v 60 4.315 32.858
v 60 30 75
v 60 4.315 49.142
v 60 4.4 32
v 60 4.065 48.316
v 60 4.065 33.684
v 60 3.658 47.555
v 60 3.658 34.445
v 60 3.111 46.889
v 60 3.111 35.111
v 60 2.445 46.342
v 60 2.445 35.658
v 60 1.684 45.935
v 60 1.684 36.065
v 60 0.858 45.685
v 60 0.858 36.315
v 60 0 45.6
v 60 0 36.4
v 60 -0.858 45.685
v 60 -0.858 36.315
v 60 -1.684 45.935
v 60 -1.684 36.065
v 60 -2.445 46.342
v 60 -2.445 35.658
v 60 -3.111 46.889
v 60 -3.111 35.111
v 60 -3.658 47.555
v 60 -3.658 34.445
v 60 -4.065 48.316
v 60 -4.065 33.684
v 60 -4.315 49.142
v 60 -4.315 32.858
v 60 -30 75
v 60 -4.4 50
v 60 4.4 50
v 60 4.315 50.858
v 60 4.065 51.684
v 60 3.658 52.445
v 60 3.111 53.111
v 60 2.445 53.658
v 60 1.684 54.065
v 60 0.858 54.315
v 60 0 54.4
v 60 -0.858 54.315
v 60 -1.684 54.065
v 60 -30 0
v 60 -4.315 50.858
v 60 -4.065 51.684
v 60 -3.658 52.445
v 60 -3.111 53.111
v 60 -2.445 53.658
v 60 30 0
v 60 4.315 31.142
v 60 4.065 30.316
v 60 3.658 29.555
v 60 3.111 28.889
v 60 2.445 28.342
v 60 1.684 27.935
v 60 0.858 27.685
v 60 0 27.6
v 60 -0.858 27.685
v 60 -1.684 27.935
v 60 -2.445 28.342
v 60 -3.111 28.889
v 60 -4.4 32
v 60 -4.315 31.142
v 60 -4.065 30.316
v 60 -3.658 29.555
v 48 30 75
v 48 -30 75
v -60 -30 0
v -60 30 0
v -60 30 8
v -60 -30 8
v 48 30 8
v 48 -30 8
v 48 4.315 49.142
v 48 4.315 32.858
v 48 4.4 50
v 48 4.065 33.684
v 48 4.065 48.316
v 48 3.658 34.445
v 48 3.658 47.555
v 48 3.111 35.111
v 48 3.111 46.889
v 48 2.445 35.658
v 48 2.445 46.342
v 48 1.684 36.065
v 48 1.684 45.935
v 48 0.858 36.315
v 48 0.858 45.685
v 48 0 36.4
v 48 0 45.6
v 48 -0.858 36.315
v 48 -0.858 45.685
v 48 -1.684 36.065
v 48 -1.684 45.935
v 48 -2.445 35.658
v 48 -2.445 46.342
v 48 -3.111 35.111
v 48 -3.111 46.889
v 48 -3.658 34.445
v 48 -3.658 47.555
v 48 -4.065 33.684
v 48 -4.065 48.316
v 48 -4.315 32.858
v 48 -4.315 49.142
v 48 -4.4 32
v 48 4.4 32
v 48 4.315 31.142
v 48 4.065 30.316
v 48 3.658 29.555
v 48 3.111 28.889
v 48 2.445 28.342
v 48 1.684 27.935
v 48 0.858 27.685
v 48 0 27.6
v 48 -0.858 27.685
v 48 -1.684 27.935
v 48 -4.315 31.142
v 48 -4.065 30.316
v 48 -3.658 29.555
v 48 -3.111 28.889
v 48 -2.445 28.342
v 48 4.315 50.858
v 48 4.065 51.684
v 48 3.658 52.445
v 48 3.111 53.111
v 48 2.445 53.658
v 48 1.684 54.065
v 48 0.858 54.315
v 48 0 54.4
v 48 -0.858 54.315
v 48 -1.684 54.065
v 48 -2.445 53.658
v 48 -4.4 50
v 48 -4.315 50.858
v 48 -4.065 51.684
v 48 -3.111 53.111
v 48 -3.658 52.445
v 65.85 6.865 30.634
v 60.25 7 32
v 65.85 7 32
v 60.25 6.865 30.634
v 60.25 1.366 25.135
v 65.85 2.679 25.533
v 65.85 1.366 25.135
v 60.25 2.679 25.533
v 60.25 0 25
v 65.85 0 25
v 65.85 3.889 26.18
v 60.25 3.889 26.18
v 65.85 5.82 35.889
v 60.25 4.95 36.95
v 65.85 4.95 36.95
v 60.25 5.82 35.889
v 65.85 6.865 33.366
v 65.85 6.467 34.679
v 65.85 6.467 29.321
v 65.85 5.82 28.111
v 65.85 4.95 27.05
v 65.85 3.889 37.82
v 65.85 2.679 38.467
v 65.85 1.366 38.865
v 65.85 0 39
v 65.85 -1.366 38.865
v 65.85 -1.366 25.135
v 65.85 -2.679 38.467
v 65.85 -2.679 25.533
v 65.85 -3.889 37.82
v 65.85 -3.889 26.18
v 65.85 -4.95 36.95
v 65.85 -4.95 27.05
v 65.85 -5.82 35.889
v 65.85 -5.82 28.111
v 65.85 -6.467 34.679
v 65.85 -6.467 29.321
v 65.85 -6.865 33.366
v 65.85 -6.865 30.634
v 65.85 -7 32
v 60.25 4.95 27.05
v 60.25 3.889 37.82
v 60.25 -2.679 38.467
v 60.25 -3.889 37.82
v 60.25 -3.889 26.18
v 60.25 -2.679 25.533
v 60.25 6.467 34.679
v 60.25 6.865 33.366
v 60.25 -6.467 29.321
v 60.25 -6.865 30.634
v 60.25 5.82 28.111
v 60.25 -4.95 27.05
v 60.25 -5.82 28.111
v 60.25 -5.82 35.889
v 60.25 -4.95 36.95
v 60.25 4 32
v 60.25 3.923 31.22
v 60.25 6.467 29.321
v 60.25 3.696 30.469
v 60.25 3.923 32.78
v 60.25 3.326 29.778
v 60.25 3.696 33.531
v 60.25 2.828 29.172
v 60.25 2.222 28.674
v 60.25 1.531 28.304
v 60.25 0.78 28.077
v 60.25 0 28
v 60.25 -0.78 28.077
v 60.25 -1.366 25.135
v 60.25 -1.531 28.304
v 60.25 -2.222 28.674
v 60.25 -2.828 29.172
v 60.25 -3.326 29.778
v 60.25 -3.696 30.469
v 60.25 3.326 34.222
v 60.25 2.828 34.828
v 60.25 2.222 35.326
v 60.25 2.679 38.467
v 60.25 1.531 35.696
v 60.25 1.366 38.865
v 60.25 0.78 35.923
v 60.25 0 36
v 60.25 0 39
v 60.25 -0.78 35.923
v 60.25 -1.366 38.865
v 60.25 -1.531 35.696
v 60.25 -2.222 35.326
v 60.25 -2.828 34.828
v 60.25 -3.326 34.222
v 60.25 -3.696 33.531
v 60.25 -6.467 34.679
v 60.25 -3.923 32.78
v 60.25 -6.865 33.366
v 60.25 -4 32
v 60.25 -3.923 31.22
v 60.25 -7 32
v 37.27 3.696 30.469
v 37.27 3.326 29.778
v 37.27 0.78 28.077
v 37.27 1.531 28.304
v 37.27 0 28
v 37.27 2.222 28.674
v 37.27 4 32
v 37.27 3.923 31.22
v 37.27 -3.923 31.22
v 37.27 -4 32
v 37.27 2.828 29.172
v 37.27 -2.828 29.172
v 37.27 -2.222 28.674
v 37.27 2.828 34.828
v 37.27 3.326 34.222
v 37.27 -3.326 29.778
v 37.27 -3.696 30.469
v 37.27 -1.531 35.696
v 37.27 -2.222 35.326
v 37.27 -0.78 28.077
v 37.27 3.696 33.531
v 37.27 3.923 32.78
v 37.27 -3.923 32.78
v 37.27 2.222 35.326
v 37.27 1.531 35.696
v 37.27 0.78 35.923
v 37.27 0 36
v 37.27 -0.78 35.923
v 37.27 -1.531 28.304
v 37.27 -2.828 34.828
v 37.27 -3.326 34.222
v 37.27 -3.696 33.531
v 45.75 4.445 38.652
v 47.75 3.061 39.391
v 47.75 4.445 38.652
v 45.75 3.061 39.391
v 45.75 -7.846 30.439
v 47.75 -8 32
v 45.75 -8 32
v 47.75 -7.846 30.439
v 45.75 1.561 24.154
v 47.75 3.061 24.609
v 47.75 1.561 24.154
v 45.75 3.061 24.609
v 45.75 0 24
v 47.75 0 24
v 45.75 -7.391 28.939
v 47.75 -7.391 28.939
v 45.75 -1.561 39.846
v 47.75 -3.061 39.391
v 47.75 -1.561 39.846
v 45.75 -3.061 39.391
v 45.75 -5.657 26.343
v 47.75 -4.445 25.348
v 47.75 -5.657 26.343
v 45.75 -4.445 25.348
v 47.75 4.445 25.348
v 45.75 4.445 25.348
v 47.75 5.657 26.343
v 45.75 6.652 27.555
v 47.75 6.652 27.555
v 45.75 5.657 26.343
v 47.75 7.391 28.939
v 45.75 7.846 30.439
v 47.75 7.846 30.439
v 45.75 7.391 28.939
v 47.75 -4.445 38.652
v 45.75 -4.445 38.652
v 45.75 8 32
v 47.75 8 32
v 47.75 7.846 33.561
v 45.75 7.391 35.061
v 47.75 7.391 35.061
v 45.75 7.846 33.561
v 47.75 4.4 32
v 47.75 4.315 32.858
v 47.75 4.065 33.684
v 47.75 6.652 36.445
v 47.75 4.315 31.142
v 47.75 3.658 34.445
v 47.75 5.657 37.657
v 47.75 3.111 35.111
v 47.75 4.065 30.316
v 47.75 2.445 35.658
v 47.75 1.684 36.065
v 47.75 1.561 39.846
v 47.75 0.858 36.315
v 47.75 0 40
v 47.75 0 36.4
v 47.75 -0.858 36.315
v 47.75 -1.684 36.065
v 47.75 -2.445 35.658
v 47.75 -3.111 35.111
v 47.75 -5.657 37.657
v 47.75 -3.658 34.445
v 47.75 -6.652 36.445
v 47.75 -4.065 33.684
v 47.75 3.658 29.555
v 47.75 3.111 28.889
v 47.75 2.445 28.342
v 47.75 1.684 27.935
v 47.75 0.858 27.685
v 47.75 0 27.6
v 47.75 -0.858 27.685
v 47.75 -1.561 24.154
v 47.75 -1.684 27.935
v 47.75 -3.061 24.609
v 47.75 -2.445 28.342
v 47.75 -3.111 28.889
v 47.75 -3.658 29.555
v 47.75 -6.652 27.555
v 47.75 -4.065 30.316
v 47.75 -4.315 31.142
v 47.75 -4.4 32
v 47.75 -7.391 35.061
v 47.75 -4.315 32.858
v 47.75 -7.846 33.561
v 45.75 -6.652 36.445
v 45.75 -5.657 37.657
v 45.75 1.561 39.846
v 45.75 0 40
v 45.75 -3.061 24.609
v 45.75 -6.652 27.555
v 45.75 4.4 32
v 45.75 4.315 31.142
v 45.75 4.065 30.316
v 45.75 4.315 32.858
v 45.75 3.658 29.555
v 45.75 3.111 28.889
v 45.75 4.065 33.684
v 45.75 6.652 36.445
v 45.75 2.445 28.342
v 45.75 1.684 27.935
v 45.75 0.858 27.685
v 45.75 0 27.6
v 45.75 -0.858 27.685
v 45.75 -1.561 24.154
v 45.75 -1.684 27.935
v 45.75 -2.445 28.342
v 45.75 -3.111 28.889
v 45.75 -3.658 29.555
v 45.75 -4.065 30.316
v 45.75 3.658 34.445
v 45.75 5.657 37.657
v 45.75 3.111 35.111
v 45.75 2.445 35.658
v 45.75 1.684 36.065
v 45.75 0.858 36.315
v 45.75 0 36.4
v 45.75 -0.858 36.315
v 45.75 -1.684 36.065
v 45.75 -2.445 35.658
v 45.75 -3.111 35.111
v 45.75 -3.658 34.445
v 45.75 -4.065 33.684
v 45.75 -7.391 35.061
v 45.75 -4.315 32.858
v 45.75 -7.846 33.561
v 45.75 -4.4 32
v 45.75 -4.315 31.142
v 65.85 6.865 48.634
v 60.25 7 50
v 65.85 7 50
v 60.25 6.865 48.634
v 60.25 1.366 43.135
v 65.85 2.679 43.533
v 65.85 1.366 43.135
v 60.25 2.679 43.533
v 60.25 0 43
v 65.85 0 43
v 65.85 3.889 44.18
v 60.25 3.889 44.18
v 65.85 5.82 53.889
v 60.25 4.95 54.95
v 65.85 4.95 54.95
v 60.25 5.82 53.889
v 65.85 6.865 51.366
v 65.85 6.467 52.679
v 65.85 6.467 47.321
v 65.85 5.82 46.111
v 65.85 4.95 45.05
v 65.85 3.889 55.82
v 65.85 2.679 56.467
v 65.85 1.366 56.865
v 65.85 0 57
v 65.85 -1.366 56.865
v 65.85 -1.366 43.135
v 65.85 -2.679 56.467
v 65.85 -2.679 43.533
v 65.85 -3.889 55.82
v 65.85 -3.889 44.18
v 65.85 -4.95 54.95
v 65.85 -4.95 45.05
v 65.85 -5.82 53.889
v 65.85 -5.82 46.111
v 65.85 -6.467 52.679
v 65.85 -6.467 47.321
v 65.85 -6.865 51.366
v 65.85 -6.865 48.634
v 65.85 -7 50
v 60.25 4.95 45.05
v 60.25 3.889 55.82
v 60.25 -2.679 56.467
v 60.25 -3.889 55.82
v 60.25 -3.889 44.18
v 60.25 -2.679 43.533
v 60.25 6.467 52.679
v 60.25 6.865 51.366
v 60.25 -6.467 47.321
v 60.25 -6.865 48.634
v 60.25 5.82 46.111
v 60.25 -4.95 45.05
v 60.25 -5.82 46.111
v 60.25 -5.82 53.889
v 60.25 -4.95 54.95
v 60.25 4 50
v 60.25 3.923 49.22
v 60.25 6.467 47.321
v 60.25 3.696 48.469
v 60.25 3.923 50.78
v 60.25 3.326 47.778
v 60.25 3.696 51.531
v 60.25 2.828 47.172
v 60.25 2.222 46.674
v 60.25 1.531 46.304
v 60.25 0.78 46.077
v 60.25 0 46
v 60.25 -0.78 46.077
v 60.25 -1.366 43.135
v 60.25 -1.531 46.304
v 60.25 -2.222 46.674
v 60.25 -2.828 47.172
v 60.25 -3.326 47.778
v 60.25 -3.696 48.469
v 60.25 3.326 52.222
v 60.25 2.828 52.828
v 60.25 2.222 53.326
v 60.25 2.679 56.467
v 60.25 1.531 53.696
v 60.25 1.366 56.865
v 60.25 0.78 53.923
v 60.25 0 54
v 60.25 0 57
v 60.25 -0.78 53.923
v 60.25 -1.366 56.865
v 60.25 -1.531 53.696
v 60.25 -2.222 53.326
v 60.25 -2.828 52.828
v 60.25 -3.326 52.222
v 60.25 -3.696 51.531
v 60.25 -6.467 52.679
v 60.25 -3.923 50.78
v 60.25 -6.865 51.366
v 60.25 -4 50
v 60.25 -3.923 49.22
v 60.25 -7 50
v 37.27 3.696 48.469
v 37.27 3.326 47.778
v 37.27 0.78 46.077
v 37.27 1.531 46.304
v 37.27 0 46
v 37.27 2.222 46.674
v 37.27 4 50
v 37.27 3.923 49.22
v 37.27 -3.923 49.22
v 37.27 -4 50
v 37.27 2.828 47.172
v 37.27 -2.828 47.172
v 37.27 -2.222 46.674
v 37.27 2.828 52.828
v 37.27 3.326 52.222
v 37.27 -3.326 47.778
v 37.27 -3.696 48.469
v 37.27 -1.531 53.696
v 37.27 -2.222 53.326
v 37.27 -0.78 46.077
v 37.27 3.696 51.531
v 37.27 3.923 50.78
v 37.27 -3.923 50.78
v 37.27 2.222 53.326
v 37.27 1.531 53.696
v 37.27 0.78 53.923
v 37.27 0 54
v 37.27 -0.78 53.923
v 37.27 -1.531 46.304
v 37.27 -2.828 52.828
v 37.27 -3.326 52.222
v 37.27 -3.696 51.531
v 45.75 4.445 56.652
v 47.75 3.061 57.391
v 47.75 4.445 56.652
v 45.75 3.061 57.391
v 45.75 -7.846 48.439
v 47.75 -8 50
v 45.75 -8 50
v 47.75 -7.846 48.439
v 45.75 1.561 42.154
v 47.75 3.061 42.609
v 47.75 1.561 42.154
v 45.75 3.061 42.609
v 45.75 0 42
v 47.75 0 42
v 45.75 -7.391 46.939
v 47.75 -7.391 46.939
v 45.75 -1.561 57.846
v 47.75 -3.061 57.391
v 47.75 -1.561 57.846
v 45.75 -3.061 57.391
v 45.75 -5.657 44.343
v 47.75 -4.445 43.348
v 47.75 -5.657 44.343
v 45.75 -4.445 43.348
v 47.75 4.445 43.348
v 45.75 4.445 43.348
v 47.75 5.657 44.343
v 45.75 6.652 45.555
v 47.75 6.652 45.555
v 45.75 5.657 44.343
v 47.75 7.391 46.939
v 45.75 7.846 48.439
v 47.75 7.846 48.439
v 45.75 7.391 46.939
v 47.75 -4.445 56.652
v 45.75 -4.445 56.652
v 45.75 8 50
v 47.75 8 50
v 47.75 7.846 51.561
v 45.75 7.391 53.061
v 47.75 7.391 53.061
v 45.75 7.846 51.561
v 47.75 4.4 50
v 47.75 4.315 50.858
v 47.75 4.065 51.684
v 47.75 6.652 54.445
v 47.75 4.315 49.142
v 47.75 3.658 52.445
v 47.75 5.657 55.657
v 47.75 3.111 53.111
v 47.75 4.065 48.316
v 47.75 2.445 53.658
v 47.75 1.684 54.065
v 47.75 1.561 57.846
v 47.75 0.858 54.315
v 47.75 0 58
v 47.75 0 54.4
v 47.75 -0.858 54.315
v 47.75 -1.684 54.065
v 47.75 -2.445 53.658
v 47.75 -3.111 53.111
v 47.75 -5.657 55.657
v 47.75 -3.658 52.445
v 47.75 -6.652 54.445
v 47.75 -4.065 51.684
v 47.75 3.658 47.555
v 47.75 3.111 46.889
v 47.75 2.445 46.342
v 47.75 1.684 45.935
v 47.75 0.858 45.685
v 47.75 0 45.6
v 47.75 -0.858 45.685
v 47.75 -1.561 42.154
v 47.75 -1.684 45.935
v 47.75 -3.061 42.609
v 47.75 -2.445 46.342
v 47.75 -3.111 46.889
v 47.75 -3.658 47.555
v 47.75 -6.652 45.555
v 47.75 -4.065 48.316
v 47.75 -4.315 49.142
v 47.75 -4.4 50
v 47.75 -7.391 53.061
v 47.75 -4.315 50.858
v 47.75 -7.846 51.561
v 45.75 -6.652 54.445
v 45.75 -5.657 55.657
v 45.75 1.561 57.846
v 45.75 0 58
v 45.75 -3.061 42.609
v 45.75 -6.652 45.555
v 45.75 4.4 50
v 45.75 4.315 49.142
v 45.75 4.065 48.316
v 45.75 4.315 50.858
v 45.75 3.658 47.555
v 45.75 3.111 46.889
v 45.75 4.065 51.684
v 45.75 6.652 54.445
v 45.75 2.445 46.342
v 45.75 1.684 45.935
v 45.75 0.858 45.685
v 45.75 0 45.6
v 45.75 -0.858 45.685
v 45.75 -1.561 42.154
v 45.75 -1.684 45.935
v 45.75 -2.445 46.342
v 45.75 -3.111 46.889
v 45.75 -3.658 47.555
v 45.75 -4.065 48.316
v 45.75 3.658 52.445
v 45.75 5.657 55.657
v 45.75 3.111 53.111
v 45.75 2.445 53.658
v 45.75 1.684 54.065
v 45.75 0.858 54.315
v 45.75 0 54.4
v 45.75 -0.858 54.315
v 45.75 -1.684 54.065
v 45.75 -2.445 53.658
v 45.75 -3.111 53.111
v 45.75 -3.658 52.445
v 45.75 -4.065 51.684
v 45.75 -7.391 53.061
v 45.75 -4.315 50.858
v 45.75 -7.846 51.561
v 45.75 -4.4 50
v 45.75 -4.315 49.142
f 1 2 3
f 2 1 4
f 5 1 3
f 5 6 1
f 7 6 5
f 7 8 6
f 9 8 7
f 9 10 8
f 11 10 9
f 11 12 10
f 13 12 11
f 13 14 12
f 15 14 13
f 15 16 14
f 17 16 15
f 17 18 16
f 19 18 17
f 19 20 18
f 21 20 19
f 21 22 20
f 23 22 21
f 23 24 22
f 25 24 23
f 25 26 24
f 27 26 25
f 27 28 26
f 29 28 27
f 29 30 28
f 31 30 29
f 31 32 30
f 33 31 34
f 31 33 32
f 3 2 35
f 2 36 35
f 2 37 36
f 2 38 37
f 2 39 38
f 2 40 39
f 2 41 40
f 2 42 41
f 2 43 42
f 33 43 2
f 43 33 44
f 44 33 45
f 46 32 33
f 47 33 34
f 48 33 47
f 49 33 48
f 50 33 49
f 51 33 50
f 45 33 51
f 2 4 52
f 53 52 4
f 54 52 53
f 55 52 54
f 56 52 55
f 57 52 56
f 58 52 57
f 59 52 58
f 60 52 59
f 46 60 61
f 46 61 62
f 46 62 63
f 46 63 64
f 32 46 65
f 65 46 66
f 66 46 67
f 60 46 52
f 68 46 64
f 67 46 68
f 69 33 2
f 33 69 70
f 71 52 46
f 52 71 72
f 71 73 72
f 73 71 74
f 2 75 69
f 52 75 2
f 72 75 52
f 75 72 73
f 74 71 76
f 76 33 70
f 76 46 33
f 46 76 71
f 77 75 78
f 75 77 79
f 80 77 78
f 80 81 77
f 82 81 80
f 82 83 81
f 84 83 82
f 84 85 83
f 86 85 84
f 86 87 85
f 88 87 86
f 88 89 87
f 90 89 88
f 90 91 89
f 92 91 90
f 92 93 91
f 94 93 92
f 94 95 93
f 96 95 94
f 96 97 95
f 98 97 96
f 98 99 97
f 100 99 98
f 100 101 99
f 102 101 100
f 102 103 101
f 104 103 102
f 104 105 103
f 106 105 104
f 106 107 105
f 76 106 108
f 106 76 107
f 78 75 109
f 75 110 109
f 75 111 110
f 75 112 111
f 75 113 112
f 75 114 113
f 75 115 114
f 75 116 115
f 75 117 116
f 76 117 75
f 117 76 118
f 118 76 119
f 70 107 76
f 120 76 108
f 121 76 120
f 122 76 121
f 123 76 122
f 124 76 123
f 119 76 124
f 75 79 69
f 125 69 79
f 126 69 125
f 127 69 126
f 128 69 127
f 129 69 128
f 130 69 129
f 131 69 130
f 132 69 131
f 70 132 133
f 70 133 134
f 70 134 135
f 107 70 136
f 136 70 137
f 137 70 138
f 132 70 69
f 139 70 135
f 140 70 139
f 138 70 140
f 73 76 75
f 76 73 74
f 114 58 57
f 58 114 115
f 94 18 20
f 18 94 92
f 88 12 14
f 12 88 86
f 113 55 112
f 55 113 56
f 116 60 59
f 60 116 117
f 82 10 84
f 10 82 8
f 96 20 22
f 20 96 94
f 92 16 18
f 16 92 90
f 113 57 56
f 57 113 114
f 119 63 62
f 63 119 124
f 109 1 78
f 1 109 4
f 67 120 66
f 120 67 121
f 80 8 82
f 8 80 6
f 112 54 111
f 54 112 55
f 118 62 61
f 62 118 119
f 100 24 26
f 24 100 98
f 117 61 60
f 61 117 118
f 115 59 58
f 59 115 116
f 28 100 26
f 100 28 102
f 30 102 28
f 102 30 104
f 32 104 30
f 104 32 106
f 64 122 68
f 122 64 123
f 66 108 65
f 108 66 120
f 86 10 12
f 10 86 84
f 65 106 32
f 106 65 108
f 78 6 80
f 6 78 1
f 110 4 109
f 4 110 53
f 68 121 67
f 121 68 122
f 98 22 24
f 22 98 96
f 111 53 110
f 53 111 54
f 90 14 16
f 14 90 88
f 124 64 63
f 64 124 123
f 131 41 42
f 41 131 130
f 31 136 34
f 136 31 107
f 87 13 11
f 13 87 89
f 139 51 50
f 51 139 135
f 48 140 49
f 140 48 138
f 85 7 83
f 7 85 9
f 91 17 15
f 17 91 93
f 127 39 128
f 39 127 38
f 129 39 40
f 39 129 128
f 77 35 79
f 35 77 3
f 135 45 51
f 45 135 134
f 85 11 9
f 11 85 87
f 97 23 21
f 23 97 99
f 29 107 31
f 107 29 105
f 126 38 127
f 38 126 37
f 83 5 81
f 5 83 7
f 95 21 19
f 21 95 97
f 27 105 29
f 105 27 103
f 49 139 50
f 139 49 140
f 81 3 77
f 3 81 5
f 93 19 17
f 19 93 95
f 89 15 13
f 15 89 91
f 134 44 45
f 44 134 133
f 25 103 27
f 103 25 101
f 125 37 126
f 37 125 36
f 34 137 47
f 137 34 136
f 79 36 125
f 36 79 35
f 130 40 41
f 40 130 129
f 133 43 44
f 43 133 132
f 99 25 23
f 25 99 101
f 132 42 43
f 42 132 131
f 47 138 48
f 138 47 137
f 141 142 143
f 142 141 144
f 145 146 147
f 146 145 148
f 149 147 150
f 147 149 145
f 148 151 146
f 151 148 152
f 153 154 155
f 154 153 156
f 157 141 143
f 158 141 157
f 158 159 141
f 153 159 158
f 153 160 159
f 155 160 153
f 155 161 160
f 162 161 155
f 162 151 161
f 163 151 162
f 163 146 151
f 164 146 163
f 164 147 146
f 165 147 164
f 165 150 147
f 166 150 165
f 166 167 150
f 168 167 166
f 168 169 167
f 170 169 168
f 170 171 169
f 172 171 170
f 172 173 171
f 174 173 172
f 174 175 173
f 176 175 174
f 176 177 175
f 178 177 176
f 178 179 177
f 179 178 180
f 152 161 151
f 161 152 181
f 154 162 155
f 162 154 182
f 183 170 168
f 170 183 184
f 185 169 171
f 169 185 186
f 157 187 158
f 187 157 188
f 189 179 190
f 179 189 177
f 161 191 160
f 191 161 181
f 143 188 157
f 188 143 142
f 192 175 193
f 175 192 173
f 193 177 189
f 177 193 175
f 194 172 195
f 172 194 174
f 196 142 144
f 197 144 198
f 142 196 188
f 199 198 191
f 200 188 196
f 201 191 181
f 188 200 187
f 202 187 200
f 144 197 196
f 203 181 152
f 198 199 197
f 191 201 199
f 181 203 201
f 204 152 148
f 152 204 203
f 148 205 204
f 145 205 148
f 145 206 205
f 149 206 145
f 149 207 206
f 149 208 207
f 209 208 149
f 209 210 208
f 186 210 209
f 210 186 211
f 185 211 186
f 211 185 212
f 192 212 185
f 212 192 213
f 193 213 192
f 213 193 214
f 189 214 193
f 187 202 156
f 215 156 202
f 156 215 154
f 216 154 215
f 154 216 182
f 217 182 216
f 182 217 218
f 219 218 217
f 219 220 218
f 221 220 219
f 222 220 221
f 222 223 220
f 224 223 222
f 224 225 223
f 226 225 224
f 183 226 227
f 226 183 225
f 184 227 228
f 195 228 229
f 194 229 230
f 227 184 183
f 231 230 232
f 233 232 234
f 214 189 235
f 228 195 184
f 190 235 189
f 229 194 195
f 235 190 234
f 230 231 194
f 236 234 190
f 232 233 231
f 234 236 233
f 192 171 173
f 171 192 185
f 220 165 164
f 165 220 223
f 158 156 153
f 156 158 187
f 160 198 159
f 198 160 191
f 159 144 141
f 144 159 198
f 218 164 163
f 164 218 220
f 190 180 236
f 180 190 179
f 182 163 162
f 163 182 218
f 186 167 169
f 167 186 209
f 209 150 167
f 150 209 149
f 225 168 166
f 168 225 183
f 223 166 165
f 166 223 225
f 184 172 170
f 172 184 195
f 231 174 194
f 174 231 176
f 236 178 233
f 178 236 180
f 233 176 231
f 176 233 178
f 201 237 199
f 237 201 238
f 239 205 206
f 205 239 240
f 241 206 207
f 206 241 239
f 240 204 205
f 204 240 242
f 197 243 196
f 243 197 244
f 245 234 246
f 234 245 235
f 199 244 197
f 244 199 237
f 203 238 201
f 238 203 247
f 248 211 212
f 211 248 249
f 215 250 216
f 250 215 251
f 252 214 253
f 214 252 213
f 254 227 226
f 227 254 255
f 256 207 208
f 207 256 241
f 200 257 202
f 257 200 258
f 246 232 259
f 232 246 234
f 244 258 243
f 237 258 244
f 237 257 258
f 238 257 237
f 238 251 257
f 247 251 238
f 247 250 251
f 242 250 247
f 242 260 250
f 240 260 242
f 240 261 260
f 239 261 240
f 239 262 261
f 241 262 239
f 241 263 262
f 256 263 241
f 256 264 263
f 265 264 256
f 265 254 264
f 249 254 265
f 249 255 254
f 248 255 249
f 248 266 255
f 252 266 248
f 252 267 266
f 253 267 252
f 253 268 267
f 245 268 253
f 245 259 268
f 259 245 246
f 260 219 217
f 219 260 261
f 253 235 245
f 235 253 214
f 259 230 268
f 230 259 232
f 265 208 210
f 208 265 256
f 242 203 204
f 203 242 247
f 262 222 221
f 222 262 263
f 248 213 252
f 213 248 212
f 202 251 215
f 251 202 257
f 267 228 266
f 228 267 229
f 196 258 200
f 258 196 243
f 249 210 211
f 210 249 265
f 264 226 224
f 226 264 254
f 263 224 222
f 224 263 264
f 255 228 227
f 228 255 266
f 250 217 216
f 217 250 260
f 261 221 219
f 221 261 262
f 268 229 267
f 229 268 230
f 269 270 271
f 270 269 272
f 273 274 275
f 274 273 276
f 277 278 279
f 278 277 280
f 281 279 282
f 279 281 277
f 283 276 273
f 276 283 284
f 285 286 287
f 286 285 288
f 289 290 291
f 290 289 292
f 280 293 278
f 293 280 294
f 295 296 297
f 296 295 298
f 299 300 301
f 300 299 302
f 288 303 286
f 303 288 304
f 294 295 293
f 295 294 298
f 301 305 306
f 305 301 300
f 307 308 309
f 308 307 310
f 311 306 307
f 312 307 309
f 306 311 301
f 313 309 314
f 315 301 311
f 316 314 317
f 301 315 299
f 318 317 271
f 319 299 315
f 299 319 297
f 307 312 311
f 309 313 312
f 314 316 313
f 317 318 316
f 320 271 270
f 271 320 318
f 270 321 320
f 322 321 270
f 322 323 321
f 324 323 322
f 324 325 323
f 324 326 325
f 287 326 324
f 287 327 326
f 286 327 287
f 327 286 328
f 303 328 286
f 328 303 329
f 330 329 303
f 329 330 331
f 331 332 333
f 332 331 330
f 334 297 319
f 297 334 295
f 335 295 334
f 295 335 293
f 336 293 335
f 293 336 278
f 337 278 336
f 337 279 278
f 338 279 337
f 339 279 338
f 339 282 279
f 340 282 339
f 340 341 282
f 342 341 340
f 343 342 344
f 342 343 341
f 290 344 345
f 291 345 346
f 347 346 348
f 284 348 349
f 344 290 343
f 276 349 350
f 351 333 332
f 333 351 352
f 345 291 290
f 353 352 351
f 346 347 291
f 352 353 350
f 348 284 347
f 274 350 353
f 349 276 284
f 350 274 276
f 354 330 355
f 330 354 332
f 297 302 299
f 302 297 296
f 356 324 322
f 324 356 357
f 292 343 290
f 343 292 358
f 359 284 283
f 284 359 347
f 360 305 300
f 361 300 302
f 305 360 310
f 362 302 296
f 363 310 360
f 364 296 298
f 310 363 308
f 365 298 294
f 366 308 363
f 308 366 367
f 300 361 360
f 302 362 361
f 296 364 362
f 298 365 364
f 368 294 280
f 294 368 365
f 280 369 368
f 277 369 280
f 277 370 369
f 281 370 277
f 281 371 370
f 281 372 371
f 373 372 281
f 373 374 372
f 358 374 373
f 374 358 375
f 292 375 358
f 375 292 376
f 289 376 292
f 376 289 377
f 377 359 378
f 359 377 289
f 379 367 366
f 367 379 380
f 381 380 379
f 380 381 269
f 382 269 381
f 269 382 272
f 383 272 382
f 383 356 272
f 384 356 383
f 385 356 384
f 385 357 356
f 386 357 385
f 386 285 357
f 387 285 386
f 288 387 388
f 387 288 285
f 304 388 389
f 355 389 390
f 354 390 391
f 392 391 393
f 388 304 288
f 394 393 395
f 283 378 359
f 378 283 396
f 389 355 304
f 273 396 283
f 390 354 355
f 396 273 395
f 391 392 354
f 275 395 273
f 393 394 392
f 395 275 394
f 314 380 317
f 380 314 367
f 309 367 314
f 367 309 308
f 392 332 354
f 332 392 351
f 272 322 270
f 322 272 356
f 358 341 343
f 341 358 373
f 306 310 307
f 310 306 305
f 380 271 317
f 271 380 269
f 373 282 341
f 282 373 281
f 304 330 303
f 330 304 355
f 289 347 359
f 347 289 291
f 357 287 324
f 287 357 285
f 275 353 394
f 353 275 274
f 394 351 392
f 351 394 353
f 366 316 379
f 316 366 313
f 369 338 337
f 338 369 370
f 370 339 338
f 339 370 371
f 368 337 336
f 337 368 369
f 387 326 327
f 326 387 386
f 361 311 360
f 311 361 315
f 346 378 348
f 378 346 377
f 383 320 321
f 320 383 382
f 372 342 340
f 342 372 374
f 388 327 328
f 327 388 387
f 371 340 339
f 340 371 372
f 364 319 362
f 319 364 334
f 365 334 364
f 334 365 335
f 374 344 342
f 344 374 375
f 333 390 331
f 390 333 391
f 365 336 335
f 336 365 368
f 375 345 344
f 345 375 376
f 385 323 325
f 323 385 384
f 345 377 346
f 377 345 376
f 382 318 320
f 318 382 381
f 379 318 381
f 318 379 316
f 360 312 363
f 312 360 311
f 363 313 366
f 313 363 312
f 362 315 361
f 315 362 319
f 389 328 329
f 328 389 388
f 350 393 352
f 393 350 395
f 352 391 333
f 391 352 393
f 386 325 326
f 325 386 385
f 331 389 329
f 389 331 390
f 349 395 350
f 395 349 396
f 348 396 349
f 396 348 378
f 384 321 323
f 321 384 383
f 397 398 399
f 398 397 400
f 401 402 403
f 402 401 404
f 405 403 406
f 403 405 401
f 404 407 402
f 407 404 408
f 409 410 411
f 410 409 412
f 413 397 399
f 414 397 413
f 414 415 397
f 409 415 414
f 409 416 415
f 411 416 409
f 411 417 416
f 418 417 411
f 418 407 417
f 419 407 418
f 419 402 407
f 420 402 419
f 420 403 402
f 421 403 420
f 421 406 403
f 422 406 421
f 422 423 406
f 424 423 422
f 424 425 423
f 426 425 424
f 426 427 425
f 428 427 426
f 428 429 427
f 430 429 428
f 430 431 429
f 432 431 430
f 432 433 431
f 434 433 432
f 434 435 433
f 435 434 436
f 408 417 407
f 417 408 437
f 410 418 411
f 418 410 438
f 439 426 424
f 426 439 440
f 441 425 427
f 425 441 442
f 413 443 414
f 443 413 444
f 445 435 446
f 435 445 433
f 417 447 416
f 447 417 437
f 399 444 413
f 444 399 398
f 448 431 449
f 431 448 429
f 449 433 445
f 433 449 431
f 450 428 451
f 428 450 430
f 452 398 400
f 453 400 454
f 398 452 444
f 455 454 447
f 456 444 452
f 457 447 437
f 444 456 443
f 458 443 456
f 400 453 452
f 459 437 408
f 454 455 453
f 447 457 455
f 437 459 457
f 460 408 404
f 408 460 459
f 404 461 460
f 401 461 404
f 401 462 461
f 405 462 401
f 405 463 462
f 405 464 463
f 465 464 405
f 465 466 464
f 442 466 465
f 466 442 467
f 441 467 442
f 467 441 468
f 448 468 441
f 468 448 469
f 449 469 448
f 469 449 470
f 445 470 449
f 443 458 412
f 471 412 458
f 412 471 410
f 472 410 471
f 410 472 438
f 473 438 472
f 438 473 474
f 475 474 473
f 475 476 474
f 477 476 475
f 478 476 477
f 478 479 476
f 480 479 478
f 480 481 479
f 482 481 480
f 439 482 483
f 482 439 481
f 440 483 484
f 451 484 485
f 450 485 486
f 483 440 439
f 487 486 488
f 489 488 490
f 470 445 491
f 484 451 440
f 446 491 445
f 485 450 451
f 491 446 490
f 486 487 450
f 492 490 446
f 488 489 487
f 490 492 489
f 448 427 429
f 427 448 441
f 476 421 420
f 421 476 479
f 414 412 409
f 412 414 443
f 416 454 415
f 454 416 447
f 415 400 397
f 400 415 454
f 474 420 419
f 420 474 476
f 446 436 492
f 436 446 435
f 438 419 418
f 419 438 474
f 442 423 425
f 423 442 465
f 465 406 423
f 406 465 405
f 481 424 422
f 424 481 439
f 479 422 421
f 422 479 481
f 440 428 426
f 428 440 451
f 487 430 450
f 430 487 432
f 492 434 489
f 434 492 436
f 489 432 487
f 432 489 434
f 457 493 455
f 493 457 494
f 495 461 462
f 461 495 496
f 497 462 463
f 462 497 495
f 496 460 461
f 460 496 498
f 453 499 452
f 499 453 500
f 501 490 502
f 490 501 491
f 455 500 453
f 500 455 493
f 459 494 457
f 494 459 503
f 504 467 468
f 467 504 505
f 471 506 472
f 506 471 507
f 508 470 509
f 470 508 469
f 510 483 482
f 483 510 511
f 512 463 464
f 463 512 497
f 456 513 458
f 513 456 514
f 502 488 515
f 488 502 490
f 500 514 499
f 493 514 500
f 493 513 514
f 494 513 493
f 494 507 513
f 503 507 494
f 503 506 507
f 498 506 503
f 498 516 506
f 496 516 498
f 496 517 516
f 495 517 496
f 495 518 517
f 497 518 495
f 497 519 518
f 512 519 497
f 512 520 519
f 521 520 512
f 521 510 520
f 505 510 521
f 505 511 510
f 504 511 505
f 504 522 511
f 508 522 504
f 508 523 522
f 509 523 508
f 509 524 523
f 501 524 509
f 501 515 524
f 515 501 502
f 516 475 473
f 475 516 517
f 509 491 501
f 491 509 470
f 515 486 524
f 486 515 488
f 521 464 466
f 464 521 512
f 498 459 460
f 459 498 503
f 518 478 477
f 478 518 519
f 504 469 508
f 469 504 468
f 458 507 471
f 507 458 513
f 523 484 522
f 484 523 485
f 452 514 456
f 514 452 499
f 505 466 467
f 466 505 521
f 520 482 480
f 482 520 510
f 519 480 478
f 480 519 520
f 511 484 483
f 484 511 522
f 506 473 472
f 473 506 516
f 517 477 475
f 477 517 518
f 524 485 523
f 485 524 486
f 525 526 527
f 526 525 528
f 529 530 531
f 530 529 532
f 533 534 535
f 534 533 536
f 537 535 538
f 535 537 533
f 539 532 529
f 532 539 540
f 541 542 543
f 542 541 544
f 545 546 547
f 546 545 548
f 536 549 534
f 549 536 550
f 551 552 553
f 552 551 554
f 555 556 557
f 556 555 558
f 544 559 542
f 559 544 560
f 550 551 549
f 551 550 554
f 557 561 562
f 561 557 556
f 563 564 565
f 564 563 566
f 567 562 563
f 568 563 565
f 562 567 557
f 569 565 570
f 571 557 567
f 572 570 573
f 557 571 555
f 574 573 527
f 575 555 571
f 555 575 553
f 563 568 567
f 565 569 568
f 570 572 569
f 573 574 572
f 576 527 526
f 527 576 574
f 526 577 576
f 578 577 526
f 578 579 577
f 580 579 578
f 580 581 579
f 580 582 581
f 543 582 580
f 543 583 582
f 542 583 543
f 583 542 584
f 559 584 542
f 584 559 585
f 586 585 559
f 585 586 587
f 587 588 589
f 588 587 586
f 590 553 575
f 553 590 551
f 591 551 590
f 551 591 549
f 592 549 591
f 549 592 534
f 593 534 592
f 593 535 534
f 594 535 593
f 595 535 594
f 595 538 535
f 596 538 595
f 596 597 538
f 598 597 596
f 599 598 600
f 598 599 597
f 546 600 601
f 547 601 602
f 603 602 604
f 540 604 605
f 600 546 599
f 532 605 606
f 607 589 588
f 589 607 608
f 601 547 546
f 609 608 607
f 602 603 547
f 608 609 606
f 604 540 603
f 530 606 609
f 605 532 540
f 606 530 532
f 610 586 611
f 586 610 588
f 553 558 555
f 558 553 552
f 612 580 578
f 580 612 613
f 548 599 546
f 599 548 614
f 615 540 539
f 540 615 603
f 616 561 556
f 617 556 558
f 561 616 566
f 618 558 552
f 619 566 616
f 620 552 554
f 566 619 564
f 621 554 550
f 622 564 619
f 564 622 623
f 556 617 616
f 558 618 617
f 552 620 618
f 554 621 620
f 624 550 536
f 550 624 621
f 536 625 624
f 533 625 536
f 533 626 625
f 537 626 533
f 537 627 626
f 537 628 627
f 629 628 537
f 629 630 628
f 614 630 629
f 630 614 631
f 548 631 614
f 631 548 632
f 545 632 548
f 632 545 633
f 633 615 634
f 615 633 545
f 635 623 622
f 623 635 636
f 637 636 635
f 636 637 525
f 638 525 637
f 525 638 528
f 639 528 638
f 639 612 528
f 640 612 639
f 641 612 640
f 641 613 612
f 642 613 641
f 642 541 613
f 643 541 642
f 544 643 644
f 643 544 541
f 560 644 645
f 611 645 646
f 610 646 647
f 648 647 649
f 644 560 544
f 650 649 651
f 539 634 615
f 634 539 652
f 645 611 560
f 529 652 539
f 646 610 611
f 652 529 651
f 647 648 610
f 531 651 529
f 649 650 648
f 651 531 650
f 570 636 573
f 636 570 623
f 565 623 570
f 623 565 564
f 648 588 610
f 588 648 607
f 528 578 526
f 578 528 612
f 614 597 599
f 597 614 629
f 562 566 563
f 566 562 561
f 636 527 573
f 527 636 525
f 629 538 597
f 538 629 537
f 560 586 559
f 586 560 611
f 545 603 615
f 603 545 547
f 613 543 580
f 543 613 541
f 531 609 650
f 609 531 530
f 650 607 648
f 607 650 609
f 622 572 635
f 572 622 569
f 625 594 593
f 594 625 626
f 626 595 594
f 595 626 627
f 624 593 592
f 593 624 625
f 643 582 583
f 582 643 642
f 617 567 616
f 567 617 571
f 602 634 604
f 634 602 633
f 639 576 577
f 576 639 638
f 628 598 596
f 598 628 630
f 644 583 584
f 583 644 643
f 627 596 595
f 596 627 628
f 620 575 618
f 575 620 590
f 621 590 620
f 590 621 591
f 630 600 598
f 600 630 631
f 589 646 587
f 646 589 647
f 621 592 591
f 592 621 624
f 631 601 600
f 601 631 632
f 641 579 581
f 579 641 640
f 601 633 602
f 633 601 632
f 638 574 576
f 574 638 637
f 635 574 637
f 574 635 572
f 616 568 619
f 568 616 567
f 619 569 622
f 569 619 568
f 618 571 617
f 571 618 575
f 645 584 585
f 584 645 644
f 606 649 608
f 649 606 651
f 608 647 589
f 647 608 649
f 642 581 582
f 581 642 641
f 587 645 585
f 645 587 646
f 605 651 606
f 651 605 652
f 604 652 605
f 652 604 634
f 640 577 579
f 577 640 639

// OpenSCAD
$fn = 32;

// ------------------------------------------------------------------------
// Bolted bracket: 120 x 60 mm bracket with 2 bolt joints
// Every part is its own module, assembly() places them once.
// ------------------------------------------------------------------------

// --- part 1 ---
module bracket() {
  difference() {
    translate([-60, -30, 0]) cube([120, 60, 75]);
    translate([-61, -31, 8]) cube([109, 62, 68]);
    translate([54, 0, 32]) rotate([0, 90, 0]) cylinder(h = 14, d = 8.8, center = true);
    translate([54, 0, 50]) rotate([0, 90, 0]) cylinder(h = 14, d = 8.8, center = true);
  }
}

// --- part 2 ---
module bolt1() {
  cylinder(h = 5.6, d = 14);
  translate([0, 0, -22.98]) cylinder(h = 22.98, d = 8);
}

// --- part 3 ---
module washer1() {
  difference() {
      translate([0, 0, 0]) cylinder(h = 2, d = 16);
      translate([0, 0, -1]) cylinder(h = 4, d = 8.8);
    }
}

// --- part 4 ---
module bolt2() {
  cylinder(h = 5.6, d = 14);
  translate([0, 0, -22.98]) cylinder(h = 22.98, d = 8);
}

// --- part 5 ---
module washer2() {
  difference() {
      translate([0, 0, 0]) cylinder(h = 2, d = 16);
      translate([0, 0, -1]) cylinder(h = 4, d = 8.8);
    }
}

// --- assembly ---
module assembly() {
  translate([0, 0, 0]) rotate([0, 0, 0]) bracket();
  translate([60.25, 0, 32]) rotate([0, 90, 0]) bolt1();
  translate([45.75, 0, 32]) rotate([0, 90, 0]) washer1();
  translate([60.25, 0, 50]) rotate([0, 90, 0]) bolt2();
  translate([45.75, 0, 50]) rotate([0, 90, 0]) washer2();
}

assembly();
